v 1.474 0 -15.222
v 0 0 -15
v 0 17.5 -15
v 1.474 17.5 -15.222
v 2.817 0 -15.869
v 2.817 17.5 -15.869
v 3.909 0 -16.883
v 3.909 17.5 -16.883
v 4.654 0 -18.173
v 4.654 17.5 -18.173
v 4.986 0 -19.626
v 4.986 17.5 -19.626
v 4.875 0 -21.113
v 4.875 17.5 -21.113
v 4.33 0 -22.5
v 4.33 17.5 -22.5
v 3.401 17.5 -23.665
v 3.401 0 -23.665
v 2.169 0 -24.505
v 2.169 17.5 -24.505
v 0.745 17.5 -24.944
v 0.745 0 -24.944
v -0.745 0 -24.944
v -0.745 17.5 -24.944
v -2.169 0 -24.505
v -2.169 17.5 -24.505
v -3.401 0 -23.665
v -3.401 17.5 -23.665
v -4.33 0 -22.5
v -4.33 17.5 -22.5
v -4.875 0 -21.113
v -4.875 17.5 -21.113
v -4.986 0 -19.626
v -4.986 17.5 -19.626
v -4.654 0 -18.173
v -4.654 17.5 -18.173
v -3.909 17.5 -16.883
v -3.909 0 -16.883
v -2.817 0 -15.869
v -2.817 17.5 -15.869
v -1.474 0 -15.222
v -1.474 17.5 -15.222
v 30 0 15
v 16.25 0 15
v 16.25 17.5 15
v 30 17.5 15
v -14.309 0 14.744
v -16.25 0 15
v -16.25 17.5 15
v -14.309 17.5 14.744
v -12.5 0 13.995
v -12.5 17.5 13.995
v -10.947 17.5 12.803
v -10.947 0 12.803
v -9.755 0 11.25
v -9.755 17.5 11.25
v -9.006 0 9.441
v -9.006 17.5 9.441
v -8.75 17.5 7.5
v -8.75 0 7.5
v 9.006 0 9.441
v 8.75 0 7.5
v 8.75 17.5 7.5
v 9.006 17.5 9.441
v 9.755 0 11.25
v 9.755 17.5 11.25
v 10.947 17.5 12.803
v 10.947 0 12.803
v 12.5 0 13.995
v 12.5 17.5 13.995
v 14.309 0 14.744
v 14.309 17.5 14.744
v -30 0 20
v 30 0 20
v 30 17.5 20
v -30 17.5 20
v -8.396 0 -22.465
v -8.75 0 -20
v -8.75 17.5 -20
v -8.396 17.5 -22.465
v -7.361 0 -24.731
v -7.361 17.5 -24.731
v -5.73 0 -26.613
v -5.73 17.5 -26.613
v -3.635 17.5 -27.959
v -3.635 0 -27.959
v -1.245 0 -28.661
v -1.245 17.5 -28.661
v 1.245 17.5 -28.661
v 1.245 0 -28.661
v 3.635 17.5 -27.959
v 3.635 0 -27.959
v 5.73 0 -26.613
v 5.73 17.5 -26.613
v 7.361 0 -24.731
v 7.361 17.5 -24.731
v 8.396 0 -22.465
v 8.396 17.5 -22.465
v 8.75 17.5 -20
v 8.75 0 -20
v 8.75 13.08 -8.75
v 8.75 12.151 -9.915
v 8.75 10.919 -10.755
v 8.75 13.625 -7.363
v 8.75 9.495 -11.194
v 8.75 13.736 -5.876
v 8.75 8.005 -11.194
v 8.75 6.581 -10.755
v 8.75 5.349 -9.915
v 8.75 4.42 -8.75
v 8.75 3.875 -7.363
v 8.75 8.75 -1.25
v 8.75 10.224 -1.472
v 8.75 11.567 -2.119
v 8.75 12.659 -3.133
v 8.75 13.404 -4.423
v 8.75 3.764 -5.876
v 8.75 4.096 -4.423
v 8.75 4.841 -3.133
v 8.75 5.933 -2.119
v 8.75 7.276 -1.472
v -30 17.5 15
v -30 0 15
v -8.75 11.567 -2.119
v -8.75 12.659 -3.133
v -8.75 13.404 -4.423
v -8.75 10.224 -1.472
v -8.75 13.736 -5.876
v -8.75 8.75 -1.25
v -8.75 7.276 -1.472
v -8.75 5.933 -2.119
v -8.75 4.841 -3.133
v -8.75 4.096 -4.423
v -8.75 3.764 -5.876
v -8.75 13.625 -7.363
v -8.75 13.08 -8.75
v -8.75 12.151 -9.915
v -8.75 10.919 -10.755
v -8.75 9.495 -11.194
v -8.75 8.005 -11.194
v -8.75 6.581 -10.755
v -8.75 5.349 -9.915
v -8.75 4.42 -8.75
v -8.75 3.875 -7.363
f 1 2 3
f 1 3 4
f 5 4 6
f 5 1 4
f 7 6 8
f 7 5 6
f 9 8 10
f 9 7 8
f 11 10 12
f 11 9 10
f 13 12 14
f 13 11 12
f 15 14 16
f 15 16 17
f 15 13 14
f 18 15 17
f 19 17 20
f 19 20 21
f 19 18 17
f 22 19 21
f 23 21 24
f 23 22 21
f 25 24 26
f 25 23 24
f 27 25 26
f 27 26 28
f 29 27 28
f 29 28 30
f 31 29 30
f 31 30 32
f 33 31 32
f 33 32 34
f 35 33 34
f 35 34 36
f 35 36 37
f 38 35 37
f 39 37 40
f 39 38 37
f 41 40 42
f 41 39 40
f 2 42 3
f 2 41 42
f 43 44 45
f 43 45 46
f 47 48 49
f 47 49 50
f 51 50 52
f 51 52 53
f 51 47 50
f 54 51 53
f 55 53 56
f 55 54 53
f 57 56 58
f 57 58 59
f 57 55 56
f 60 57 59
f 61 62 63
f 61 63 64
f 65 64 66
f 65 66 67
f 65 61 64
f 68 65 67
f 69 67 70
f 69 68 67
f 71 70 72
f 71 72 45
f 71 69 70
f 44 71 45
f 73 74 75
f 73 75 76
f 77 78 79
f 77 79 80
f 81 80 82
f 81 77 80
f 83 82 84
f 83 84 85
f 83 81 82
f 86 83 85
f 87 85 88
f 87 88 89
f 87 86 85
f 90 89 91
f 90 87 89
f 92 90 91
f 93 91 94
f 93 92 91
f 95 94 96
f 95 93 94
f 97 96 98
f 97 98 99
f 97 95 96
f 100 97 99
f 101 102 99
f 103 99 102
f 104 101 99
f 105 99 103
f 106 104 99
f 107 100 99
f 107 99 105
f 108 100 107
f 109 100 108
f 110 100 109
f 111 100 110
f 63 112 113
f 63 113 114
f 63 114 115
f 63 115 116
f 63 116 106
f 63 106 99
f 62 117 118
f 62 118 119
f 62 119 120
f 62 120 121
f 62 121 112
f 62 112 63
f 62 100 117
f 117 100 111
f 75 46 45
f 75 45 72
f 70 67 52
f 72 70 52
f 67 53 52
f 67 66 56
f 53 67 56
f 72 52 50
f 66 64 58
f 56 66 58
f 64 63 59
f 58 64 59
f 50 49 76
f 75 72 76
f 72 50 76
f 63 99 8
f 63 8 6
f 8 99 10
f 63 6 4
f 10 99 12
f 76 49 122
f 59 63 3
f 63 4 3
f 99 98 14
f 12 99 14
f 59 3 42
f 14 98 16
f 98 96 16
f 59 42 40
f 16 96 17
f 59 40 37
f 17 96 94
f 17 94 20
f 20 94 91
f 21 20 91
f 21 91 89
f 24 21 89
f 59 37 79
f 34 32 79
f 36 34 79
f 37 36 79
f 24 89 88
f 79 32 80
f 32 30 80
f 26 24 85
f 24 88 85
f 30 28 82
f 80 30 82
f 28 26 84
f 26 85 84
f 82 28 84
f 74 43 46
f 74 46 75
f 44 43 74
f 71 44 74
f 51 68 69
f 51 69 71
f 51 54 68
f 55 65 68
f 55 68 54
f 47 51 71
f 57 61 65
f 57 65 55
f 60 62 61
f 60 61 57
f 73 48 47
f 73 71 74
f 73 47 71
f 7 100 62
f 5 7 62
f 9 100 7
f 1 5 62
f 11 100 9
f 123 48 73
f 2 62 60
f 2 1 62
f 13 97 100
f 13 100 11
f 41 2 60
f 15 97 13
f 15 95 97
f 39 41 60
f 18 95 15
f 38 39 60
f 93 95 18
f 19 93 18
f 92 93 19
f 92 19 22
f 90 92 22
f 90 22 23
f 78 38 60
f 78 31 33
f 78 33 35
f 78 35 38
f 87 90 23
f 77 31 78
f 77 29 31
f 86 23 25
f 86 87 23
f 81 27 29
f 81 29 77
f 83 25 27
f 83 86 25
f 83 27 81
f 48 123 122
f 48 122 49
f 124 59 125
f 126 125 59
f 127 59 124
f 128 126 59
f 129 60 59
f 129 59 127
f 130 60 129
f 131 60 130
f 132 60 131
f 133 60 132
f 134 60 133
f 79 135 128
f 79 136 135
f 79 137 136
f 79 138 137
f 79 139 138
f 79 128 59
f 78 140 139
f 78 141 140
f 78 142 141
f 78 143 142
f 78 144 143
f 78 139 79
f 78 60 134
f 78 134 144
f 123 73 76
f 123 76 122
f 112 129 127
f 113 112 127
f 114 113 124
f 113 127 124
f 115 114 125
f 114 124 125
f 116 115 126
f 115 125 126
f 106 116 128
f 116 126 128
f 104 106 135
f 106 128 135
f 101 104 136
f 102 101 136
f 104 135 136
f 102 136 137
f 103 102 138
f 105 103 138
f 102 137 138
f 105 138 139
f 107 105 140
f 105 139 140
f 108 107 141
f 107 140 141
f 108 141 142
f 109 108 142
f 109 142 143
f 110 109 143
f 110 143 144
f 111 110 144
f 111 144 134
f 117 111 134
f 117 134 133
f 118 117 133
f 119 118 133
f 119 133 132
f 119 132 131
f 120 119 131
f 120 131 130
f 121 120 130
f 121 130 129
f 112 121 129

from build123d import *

# Parameters (mm, degrees)
SKETCH2_R           = 5
BOSS_EXTRUDE1_DEPTH = 17.5
SKETCH3_R           = 5
CUT_EXTRUDE1_DEPTH  = 52.326162919


with BuildPart() as part:
    # Sketch2 → Boss-Extrude1 (new body)
    with BuildSketch(Plane(origin=(0, 0, 0), x_dir=(1, 0, 0), z_dir=(0, 1, 0))):
        with BuildLine():
            Line((-8.75, -7.5), (-8.75, 20))
            ThreePointArc((-8.75, 20), (0, 28.75), (8.75, 20))
            Line((8.75, 20), (8.75, -7.5))
            ThreePointArc((8.75, -7.5), (10.946699141, -12.803300859), (16.25, -15))
            Line((16.25, -15), (30, -15))
            Line((30, -15), (30, -20))
            Line((30, -20), (-30, -20))
            Line((-30, -20), (-30, -15))
            Line((-30, -15), (-16.25, -15))
            ThreePointArc((-16.25, -15), (-10.946699141, -12.803300859), (-8.75, -7.5))
        make_face()
        with Locations(Location((0, 20, 0), (0, 0, 270))):
            Circle(SKETCH2_R, mode=Mode.SUBTRACT)
    extrude(amount=BOSS_EXTRUDE1_DEPTH)

    # Sketch3 → Cut-Extrude1 (cut, through all)
    with BuildSketch(Plane.ZY.offset(8.75)):
        with Locations((-6.25, 8.75)):
            Circle(SKETCH3_R)
    extrude(amount=-CUT_EXTRUDE1_DEPTH, mode=Mode.SUBTRACT)


solid = part.part
